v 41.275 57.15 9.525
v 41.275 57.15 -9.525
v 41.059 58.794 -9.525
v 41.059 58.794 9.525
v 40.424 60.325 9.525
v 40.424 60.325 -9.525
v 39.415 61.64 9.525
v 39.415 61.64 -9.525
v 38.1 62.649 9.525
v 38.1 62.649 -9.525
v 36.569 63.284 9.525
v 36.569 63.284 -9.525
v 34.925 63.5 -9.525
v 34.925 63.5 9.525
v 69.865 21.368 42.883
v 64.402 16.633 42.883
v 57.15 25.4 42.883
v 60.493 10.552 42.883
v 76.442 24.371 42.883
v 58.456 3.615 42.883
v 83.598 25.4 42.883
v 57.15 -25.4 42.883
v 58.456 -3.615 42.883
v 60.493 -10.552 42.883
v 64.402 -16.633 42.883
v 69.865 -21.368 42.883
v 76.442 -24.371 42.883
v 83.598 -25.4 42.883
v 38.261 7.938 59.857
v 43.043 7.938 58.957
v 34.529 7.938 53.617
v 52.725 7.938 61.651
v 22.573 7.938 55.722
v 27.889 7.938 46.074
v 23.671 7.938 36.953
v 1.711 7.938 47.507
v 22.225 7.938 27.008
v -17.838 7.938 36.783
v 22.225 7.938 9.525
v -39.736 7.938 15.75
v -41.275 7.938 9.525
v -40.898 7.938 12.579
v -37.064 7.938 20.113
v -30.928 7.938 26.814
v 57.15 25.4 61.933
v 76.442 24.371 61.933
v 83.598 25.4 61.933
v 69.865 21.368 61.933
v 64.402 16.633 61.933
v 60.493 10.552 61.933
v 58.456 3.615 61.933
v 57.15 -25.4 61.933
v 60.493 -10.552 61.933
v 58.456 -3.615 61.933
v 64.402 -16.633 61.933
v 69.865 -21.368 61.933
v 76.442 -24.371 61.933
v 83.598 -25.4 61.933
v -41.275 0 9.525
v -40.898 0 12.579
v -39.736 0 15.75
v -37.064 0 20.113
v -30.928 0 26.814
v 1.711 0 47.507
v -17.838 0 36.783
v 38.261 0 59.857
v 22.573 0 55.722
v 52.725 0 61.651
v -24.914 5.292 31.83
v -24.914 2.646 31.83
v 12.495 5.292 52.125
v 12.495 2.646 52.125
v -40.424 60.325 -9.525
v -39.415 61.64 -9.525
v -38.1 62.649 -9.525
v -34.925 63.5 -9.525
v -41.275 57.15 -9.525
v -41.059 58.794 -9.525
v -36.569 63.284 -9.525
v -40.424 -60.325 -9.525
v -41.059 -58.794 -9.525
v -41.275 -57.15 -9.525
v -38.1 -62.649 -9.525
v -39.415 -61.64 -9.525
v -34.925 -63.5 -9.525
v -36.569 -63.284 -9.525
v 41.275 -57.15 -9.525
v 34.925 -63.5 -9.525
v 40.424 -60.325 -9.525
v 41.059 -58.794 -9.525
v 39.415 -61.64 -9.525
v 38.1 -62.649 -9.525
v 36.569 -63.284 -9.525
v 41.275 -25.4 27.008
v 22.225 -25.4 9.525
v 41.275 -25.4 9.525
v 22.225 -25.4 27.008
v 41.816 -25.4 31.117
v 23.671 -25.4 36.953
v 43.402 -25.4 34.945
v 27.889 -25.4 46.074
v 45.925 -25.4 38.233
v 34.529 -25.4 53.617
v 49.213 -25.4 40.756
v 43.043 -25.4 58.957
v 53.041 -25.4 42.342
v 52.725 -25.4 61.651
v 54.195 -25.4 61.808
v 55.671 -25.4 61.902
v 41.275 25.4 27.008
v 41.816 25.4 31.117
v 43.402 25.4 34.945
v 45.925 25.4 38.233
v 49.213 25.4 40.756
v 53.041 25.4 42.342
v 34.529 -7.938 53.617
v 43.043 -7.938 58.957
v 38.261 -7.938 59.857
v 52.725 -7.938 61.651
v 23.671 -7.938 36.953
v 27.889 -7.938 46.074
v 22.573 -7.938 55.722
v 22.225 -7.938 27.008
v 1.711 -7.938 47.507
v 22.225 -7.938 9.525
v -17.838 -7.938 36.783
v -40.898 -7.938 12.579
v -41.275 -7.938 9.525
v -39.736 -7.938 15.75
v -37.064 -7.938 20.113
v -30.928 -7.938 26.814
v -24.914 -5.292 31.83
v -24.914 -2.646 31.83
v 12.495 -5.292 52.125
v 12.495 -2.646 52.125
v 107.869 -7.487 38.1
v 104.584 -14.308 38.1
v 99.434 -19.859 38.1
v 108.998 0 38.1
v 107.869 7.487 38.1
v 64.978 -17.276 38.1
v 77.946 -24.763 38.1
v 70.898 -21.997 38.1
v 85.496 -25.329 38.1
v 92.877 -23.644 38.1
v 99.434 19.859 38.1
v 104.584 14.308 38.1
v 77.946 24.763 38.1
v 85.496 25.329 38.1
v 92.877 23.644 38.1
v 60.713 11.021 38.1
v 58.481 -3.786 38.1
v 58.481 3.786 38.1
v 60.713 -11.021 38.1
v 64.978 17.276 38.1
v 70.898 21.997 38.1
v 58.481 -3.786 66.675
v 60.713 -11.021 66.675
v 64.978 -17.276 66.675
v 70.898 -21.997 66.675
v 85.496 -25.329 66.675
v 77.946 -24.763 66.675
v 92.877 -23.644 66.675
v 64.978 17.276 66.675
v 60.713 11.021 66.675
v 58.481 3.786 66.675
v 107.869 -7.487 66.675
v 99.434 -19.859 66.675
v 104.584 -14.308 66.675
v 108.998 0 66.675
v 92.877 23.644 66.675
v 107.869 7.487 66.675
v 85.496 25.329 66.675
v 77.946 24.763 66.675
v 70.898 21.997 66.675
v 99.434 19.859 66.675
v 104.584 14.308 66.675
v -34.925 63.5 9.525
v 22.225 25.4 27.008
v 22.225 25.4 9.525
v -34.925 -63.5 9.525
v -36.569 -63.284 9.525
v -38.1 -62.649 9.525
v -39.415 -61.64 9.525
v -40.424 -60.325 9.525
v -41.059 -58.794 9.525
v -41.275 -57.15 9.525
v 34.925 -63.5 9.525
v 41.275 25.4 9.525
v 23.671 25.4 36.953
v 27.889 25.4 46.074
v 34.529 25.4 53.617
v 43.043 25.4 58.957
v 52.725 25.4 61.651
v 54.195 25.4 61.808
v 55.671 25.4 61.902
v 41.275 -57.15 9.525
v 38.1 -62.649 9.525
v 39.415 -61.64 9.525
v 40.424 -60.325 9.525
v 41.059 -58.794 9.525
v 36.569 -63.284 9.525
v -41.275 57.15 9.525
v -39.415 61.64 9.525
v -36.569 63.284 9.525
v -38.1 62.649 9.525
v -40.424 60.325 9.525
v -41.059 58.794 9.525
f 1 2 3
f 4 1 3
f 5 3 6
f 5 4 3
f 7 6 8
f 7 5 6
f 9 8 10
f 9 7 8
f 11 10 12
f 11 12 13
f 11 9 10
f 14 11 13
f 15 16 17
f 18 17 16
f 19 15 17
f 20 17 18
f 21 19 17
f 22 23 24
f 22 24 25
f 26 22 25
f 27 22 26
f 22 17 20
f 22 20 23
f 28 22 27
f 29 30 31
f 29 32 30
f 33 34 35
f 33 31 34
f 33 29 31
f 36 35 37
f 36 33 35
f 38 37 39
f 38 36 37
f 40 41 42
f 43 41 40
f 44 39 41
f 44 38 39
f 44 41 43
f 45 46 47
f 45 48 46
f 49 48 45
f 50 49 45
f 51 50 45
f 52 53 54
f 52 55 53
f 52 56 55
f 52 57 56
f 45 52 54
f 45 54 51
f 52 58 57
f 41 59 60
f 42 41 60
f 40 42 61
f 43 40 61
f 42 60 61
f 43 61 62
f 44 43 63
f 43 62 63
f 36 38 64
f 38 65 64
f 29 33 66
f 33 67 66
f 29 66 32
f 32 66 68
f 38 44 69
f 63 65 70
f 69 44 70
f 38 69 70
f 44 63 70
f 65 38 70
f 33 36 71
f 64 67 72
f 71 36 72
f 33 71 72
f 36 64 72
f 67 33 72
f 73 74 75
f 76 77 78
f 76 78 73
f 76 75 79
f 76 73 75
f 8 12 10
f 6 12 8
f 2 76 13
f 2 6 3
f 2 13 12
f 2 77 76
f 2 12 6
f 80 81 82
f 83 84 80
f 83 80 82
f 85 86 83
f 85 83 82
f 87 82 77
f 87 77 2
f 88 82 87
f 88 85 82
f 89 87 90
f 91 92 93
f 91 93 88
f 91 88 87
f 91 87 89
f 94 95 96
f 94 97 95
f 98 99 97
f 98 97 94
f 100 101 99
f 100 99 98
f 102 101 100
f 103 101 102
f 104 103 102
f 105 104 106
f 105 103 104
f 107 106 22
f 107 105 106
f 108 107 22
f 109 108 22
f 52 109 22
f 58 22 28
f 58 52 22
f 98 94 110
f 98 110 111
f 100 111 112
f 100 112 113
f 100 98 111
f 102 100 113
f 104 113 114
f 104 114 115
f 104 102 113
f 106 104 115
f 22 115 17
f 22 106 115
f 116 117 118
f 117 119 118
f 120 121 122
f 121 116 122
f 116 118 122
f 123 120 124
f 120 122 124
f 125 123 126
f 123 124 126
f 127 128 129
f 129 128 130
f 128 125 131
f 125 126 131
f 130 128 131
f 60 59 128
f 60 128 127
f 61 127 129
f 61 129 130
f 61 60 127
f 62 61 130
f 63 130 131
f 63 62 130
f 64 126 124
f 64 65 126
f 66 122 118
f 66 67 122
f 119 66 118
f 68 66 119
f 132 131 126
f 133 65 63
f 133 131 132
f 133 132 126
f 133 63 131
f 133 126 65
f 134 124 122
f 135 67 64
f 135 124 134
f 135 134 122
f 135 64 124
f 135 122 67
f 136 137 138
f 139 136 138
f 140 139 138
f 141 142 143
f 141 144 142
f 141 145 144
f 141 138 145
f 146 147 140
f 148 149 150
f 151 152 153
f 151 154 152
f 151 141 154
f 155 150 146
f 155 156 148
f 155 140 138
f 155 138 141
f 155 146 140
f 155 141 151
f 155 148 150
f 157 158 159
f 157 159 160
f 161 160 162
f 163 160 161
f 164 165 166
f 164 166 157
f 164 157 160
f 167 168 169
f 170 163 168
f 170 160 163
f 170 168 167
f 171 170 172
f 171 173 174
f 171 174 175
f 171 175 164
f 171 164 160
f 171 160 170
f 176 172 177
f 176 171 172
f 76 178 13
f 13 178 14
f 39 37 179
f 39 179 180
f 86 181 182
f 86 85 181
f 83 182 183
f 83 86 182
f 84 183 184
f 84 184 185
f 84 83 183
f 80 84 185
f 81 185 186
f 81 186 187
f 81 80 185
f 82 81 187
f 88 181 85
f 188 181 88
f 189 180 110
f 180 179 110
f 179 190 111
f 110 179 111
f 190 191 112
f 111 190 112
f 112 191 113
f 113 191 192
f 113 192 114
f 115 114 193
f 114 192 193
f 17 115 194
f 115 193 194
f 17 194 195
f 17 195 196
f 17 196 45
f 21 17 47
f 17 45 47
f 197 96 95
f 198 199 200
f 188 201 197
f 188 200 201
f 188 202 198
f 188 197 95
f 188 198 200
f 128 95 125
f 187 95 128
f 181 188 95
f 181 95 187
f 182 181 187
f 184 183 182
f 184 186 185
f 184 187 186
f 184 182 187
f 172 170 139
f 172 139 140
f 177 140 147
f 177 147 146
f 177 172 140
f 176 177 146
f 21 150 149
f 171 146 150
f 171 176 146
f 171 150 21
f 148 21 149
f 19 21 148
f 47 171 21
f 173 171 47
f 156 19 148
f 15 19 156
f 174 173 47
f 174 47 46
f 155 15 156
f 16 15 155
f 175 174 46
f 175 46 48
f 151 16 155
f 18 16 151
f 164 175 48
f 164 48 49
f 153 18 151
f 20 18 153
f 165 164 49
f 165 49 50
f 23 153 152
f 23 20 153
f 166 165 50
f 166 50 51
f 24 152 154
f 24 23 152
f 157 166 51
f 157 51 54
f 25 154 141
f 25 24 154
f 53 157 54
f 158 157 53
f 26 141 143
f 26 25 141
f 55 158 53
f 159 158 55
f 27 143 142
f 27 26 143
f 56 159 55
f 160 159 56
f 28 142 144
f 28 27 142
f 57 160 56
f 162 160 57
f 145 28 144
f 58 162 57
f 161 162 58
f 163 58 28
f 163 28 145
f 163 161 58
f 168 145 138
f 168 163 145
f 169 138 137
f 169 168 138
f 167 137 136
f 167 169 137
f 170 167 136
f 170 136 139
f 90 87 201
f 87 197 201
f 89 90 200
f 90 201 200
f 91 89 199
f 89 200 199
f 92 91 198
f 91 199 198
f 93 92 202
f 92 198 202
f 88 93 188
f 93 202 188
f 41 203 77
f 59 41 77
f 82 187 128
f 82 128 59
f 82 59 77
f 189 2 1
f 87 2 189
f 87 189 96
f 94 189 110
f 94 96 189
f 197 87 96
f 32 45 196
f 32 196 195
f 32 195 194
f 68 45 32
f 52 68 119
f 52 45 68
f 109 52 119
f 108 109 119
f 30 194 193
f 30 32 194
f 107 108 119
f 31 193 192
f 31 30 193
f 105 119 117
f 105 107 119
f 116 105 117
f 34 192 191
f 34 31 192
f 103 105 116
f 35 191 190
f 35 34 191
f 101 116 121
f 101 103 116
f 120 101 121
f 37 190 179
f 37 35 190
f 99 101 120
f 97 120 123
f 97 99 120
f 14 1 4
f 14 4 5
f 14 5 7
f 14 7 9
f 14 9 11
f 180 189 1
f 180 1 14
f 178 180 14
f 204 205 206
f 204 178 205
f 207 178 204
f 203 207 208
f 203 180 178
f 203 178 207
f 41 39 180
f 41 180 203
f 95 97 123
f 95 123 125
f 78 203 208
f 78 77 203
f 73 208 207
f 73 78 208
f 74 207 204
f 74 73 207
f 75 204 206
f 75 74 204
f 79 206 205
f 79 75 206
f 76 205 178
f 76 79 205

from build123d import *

# Parameters (mm, degrees)
F1_DEPTH = 63.5
F0_W     = 25.4
F0_H     = 19.05
F2_DEPTH = 25.4
F3_DEPTH = 7.9375
F5_R     = 6.35


with BuildPart() as f1:
    # F0 (on Front) → F1 (new body, symmetric)
    with BuildSketch(Plane.XZ):
        Polygon((-41.275, 9.525), (-41.275, -9.525), (41.275, -9.525), (41.275, 9.525), (22.225, 9.525), align=None)
    extrude(amount=F1_DEPTH, both=True)

    # F0 (on Front) → F2 (join, symmetric)
    with BuildSketch(Plane.XZ):
        with BuildLine():
            Line((22.225, 9.525), (41.275, 9.525))
            Line((41.275, 9.525), (41.275, 27.00782))
            ThreePointArc((41.275, 27.00782), (45.9246798487, 38.2331401513), (57.15, 42.88282))
            Line((57.15, 42.88282), (58.1977560132, 42.88282))
            Line((58.1977560132, 42.88282), (58.1977560132, 61.93282))
            Line((58.1977560132, 61.93282), (57.15, 61.93282))
            ThreePointArc((57.15, 61.93282), (54.9328944769, 61.862375916), (52.724732803, 61.6513278368))
            ThreePointArc((52.724732803, 61.6513278368), (30.9363768066, 50.0859824934), (22.225, 27.00782))
            Line((22.225, 27.00782), (22.225, 9.525))
        make_face()
        with Locations((70.8977560132, 52.40782)):
            Rectangle(F0_W, F0_H)
    extrude(amount=F2_DEPTH, both=True)

    # F0 (on Front) → F3 (join, symmetric)
    with BuildSketch(Plane.XZ):
        with BuildLine():
            add(Edge.make_bspline(
                [(-41.275, 9.525), (-41.5120311081, 29.9139209092), (17.1590354294, 60.4301430285), (52.724732803, 61.6513278368)],
                knots=[0, 0, 0, 0, 107.4853656122, 107.4853656122, 107.4853656122, 107.4853656122], degree=3))
            Line((-41.275, 9.525), (22.225, 9.525))
            Line((22.225, 9.525), (22.225, 27.00782))
            ThreePointArc((22.225, 27.00782), (30.9363768066, 50.0859824934), (52.724732803, 61.6513278368))
        make_face()
    extrude(amount=F3_DEPTH, both=True)

    # F0 (on Front) → F4 (revolve)
    with BuildSketch(Plane.XZ):
        Polygon((83.5977560132, 66.675), (83.5977560132, 61.93282), (83.5977560132, 42.88282), (83.5977560132, 38.1), (108.9977560132, 38.1), (108.9977560132, 66.675), align=None)
    revolve(axis=Axis((83.5977560132, 0, 52.3875), (0, 0, 1)))

    # F5
    f5_edges = [f1.edges().sort_by_distance(p)[0] for p in [
        (41.275, -63.5, 0),
        (-41.275, -63.5, 0),
        (41.275, 63.5, 0),
        (-41.275, 63.5, 0),
    ]]
    fillet(f5_edges, radius=F5_R)


solid = f1.part
